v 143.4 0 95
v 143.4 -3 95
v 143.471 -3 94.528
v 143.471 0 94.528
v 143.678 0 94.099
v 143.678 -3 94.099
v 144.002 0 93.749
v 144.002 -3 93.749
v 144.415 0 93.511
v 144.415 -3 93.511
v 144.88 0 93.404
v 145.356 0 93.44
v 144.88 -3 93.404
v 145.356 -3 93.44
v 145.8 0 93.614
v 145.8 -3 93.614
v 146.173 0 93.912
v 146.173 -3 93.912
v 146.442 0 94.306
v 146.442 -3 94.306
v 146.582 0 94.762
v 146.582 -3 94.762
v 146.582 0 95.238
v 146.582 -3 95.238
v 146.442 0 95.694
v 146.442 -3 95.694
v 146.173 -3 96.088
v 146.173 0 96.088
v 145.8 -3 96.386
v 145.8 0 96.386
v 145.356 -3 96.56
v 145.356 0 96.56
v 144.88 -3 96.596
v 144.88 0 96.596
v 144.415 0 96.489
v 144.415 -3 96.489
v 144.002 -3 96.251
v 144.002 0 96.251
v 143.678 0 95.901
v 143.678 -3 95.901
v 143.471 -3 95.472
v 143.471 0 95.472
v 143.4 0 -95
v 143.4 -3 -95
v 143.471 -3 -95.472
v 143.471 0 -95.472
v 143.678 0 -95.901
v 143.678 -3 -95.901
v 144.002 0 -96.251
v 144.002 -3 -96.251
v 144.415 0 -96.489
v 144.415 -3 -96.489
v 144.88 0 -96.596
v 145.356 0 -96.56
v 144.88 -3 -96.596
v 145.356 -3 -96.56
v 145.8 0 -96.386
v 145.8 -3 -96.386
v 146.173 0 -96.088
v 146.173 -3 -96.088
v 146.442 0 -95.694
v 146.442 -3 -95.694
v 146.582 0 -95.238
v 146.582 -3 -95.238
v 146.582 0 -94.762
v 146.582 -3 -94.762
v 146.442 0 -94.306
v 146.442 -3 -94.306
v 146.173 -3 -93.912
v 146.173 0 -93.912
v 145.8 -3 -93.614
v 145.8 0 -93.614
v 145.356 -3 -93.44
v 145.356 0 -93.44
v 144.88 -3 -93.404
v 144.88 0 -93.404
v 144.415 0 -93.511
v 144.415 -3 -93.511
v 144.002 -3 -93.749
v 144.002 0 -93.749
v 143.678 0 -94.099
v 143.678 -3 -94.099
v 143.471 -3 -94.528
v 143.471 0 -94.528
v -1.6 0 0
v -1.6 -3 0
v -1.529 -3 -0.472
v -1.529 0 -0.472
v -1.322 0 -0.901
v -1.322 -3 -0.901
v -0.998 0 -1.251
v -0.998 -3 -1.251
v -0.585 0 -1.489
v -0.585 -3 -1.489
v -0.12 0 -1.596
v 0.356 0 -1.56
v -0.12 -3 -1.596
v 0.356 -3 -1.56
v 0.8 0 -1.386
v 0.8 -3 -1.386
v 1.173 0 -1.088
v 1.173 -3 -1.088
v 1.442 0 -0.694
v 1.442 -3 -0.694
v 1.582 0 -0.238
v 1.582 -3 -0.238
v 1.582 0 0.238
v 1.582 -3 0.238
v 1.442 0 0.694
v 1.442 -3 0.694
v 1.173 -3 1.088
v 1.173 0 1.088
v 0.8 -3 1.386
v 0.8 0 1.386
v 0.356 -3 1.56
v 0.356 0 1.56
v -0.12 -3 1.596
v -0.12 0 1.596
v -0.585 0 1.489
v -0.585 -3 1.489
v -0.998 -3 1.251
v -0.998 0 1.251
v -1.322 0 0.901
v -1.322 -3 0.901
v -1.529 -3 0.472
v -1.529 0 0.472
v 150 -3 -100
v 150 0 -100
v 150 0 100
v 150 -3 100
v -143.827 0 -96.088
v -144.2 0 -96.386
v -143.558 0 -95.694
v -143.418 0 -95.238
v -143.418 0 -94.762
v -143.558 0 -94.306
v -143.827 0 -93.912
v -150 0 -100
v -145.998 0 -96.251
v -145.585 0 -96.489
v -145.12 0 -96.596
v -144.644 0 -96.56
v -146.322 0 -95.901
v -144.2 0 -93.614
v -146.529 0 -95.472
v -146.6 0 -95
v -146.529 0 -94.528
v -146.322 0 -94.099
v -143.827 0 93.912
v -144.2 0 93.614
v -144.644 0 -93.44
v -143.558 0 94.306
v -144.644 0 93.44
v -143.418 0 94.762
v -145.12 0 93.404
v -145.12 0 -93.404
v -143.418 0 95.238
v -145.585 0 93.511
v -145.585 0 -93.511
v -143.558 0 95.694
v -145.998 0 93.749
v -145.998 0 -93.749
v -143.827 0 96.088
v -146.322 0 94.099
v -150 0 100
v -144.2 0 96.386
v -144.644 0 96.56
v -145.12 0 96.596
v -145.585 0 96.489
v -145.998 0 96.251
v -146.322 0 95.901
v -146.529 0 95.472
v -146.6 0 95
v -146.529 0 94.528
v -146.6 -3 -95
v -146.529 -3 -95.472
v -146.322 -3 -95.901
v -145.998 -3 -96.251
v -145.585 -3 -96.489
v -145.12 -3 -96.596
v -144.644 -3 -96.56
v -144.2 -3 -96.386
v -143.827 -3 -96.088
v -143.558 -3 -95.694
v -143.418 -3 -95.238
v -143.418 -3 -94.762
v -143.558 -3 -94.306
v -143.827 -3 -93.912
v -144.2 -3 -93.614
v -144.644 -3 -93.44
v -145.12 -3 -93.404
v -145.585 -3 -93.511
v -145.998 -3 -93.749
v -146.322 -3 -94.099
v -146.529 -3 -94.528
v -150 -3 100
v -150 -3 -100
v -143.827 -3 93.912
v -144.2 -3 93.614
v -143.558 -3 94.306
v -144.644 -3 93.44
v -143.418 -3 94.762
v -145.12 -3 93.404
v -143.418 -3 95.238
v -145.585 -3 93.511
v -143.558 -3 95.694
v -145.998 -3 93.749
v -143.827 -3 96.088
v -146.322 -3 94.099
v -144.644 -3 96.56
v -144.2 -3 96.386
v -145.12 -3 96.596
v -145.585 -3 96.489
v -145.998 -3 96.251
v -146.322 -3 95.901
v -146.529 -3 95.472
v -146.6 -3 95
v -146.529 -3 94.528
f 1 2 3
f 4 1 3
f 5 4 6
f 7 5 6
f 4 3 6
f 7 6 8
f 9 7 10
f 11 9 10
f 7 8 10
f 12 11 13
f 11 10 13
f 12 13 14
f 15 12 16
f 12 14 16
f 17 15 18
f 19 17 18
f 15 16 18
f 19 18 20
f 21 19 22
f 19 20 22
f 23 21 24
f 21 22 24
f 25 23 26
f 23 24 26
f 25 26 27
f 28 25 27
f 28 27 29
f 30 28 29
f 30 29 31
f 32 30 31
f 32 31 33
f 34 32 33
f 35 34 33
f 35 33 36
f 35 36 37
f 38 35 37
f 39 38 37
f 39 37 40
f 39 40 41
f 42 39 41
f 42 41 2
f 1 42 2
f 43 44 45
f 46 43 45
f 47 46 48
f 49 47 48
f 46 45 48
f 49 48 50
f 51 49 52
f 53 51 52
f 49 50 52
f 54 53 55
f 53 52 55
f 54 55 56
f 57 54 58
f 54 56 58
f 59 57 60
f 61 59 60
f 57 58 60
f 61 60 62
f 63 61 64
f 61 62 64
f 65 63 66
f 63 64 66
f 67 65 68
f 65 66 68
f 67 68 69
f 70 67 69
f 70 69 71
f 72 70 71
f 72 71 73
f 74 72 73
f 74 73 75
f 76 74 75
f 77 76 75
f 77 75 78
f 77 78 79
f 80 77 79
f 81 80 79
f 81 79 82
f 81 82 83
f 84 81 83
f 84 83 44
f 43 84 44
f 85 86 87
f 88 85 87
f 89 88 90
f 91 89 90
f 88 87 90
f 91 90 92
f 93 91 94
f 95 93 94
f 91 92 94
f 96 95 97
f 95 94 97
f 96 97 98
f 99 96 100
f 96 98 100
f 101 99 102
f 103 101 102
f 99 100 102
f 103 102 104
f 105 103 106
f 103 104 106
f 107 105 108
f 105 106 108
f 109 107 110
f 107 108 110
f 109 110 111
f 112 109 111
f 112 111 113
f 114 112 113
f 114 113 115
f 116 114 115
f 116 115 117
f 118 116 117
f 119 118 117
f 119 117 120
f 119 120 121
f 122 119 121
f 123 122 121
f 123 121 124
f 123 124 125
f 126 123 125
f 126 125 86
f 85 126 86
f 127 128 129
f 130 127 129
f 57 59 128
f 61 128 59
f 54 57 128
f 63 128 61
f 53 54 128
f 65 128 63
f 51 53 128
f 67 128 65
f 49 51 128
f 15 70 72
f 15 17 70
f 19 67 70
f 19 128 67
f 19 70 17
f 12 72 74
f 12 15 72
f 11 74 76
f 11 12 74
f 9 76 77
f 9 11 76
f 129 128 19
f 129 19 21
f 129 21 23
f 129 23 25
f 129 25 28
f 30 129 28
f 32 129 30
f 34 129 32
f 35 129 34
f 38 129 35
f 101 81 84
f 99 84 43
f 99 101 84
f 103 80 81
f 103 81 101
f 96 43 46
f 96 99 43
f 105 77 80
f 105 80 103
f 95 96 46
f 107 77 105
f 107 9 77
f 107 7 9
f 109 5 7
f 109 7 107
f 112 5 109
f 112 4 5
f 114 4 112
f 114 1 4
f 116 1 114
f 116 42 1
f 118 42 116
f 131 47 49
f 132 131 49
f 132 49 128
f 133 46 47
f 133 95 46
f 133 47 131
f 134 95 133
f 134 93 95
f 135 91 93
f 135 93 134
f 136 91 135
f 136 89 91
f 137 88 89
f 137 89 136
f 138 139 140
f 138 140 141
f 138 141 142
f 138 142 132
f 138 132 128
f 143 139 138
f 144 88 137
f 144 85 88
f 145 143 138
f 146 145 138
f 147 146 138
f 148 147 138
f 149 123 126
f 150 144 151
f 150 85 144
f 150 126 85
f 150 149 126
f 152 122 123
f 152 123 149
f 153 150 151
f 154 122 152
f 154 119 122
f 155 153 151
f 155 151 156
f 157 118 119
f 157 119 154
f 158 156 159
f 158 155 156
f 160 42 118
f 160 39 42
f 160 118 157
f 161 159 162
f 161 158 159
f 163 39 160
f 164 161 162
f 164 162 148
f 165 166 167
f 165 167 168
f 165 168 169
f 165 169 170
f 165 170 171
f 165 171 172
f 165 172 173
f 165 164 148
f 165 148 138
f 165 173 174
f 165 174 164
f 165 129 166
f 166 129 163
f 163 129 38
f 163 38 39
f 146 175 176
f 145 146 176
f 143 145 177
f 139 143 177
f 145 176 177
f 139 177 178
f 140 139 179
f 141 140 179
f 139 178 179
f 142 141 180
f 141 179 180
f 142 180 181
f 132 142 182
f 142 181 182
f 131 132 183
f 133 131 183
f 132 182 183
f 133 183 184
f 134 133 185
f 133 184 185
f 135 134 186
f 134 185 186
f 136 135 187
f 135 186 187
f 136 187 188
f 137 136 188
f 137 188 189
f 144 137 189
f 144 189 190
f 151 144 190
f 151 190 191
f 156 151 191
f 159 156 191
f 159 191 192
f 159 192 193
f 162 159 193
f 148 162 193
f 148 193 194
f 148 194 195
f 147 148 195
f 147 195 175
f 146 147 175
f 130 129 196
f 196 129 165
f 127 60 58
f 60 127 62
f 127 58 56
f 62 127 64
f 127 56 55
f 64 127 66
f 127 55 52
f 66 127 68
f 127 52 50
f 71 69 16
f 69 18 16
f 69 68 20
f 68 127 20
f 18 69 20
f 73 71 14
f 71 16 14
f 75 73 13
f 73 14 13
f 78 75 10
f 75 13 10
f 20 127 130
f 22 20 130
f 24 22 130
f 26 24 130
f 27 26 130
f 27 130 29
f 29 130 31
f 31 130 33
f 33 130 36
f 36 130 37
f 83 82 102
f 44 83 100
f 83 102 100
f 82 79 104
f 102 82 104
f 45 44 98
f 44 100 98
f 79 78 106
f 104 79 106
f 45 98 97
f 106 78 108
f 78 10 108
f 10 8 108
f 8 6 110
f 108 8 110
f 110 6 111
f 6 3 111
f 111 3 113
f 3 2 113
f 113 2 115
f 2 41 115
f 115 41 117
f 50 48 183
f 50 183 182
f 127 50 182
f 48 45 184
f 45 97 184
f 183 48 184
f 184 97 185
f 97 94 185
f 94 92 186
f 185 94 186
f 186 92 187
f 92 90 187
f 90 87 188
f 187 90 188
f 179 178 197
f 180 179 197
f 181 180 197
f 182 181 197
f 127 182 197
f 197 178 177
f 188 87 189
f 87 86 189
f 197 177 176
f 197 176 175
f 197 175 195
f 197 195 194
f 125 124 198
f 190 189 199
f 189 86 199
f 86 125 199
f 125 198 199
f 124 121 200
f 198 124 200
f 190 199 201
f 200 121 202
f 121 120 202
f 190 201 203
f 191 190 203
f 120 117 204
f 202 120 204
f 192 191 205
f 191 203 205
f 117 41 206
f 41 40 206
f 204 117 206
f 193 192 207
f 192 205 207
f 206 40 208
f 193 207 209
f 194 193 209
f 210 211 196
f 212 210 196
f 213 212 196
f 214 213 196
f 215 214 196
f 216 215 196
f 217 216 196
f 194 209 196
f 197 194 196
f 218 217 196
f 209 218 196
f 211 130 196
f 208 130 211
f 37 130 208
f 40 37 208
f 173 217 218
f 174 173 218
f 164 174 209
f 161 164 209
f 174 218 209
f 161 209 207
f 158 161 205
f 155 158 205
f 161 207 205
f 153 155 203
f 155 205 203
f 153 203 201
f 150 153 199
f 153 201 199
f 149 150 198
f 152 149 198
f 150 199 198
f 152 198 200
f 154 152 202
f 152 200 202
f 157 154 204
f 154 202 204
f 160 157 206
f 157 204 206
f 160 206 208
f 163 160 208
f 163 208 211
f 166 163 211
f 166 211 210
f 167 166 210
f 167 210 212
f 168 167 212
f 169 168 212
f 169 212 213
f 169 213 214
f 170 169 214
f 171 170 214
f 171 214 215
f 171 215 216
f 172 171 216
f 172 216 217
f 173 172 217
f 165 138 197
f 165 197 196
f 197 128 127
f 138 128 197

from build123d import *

# Parameters (mm, degrees)
SKETCH1_W                  = 300
SKETCH1_H                  = 200
EXTRUSION1_DEPTH           = 3
F_3_2_3_2_DIAMETER_HOLE1_D = 3.2


with BuildPart() as part:
    # Sketch1 → Extrusion1 (new body)
    with BuildSketch(Plane(origin=(0, 0, 0), x_dir=(-1, 0, 0), z_dir=(0, 1, 0))):
        Rectangle(SKETCH1_W, SKETCH1_H)
    extrude(amount=-EXTRUSION1_DEPTH)

    # Ø3.2 (3.2) Diameter Hole1 (through all)
    with Locations(Plane(origin=(0, 0, 0), x_dir=(1, 0, 0), z_dir=(0, 1, 0))):
        with Locations((-145, 95), (145, 95), (145, -95), (0, -104.5), (-145, -95), (0, 0)):
            Hole(F_3_2_3_2_DIAMETER_HOLE1_D / 2)


solid = part.part
